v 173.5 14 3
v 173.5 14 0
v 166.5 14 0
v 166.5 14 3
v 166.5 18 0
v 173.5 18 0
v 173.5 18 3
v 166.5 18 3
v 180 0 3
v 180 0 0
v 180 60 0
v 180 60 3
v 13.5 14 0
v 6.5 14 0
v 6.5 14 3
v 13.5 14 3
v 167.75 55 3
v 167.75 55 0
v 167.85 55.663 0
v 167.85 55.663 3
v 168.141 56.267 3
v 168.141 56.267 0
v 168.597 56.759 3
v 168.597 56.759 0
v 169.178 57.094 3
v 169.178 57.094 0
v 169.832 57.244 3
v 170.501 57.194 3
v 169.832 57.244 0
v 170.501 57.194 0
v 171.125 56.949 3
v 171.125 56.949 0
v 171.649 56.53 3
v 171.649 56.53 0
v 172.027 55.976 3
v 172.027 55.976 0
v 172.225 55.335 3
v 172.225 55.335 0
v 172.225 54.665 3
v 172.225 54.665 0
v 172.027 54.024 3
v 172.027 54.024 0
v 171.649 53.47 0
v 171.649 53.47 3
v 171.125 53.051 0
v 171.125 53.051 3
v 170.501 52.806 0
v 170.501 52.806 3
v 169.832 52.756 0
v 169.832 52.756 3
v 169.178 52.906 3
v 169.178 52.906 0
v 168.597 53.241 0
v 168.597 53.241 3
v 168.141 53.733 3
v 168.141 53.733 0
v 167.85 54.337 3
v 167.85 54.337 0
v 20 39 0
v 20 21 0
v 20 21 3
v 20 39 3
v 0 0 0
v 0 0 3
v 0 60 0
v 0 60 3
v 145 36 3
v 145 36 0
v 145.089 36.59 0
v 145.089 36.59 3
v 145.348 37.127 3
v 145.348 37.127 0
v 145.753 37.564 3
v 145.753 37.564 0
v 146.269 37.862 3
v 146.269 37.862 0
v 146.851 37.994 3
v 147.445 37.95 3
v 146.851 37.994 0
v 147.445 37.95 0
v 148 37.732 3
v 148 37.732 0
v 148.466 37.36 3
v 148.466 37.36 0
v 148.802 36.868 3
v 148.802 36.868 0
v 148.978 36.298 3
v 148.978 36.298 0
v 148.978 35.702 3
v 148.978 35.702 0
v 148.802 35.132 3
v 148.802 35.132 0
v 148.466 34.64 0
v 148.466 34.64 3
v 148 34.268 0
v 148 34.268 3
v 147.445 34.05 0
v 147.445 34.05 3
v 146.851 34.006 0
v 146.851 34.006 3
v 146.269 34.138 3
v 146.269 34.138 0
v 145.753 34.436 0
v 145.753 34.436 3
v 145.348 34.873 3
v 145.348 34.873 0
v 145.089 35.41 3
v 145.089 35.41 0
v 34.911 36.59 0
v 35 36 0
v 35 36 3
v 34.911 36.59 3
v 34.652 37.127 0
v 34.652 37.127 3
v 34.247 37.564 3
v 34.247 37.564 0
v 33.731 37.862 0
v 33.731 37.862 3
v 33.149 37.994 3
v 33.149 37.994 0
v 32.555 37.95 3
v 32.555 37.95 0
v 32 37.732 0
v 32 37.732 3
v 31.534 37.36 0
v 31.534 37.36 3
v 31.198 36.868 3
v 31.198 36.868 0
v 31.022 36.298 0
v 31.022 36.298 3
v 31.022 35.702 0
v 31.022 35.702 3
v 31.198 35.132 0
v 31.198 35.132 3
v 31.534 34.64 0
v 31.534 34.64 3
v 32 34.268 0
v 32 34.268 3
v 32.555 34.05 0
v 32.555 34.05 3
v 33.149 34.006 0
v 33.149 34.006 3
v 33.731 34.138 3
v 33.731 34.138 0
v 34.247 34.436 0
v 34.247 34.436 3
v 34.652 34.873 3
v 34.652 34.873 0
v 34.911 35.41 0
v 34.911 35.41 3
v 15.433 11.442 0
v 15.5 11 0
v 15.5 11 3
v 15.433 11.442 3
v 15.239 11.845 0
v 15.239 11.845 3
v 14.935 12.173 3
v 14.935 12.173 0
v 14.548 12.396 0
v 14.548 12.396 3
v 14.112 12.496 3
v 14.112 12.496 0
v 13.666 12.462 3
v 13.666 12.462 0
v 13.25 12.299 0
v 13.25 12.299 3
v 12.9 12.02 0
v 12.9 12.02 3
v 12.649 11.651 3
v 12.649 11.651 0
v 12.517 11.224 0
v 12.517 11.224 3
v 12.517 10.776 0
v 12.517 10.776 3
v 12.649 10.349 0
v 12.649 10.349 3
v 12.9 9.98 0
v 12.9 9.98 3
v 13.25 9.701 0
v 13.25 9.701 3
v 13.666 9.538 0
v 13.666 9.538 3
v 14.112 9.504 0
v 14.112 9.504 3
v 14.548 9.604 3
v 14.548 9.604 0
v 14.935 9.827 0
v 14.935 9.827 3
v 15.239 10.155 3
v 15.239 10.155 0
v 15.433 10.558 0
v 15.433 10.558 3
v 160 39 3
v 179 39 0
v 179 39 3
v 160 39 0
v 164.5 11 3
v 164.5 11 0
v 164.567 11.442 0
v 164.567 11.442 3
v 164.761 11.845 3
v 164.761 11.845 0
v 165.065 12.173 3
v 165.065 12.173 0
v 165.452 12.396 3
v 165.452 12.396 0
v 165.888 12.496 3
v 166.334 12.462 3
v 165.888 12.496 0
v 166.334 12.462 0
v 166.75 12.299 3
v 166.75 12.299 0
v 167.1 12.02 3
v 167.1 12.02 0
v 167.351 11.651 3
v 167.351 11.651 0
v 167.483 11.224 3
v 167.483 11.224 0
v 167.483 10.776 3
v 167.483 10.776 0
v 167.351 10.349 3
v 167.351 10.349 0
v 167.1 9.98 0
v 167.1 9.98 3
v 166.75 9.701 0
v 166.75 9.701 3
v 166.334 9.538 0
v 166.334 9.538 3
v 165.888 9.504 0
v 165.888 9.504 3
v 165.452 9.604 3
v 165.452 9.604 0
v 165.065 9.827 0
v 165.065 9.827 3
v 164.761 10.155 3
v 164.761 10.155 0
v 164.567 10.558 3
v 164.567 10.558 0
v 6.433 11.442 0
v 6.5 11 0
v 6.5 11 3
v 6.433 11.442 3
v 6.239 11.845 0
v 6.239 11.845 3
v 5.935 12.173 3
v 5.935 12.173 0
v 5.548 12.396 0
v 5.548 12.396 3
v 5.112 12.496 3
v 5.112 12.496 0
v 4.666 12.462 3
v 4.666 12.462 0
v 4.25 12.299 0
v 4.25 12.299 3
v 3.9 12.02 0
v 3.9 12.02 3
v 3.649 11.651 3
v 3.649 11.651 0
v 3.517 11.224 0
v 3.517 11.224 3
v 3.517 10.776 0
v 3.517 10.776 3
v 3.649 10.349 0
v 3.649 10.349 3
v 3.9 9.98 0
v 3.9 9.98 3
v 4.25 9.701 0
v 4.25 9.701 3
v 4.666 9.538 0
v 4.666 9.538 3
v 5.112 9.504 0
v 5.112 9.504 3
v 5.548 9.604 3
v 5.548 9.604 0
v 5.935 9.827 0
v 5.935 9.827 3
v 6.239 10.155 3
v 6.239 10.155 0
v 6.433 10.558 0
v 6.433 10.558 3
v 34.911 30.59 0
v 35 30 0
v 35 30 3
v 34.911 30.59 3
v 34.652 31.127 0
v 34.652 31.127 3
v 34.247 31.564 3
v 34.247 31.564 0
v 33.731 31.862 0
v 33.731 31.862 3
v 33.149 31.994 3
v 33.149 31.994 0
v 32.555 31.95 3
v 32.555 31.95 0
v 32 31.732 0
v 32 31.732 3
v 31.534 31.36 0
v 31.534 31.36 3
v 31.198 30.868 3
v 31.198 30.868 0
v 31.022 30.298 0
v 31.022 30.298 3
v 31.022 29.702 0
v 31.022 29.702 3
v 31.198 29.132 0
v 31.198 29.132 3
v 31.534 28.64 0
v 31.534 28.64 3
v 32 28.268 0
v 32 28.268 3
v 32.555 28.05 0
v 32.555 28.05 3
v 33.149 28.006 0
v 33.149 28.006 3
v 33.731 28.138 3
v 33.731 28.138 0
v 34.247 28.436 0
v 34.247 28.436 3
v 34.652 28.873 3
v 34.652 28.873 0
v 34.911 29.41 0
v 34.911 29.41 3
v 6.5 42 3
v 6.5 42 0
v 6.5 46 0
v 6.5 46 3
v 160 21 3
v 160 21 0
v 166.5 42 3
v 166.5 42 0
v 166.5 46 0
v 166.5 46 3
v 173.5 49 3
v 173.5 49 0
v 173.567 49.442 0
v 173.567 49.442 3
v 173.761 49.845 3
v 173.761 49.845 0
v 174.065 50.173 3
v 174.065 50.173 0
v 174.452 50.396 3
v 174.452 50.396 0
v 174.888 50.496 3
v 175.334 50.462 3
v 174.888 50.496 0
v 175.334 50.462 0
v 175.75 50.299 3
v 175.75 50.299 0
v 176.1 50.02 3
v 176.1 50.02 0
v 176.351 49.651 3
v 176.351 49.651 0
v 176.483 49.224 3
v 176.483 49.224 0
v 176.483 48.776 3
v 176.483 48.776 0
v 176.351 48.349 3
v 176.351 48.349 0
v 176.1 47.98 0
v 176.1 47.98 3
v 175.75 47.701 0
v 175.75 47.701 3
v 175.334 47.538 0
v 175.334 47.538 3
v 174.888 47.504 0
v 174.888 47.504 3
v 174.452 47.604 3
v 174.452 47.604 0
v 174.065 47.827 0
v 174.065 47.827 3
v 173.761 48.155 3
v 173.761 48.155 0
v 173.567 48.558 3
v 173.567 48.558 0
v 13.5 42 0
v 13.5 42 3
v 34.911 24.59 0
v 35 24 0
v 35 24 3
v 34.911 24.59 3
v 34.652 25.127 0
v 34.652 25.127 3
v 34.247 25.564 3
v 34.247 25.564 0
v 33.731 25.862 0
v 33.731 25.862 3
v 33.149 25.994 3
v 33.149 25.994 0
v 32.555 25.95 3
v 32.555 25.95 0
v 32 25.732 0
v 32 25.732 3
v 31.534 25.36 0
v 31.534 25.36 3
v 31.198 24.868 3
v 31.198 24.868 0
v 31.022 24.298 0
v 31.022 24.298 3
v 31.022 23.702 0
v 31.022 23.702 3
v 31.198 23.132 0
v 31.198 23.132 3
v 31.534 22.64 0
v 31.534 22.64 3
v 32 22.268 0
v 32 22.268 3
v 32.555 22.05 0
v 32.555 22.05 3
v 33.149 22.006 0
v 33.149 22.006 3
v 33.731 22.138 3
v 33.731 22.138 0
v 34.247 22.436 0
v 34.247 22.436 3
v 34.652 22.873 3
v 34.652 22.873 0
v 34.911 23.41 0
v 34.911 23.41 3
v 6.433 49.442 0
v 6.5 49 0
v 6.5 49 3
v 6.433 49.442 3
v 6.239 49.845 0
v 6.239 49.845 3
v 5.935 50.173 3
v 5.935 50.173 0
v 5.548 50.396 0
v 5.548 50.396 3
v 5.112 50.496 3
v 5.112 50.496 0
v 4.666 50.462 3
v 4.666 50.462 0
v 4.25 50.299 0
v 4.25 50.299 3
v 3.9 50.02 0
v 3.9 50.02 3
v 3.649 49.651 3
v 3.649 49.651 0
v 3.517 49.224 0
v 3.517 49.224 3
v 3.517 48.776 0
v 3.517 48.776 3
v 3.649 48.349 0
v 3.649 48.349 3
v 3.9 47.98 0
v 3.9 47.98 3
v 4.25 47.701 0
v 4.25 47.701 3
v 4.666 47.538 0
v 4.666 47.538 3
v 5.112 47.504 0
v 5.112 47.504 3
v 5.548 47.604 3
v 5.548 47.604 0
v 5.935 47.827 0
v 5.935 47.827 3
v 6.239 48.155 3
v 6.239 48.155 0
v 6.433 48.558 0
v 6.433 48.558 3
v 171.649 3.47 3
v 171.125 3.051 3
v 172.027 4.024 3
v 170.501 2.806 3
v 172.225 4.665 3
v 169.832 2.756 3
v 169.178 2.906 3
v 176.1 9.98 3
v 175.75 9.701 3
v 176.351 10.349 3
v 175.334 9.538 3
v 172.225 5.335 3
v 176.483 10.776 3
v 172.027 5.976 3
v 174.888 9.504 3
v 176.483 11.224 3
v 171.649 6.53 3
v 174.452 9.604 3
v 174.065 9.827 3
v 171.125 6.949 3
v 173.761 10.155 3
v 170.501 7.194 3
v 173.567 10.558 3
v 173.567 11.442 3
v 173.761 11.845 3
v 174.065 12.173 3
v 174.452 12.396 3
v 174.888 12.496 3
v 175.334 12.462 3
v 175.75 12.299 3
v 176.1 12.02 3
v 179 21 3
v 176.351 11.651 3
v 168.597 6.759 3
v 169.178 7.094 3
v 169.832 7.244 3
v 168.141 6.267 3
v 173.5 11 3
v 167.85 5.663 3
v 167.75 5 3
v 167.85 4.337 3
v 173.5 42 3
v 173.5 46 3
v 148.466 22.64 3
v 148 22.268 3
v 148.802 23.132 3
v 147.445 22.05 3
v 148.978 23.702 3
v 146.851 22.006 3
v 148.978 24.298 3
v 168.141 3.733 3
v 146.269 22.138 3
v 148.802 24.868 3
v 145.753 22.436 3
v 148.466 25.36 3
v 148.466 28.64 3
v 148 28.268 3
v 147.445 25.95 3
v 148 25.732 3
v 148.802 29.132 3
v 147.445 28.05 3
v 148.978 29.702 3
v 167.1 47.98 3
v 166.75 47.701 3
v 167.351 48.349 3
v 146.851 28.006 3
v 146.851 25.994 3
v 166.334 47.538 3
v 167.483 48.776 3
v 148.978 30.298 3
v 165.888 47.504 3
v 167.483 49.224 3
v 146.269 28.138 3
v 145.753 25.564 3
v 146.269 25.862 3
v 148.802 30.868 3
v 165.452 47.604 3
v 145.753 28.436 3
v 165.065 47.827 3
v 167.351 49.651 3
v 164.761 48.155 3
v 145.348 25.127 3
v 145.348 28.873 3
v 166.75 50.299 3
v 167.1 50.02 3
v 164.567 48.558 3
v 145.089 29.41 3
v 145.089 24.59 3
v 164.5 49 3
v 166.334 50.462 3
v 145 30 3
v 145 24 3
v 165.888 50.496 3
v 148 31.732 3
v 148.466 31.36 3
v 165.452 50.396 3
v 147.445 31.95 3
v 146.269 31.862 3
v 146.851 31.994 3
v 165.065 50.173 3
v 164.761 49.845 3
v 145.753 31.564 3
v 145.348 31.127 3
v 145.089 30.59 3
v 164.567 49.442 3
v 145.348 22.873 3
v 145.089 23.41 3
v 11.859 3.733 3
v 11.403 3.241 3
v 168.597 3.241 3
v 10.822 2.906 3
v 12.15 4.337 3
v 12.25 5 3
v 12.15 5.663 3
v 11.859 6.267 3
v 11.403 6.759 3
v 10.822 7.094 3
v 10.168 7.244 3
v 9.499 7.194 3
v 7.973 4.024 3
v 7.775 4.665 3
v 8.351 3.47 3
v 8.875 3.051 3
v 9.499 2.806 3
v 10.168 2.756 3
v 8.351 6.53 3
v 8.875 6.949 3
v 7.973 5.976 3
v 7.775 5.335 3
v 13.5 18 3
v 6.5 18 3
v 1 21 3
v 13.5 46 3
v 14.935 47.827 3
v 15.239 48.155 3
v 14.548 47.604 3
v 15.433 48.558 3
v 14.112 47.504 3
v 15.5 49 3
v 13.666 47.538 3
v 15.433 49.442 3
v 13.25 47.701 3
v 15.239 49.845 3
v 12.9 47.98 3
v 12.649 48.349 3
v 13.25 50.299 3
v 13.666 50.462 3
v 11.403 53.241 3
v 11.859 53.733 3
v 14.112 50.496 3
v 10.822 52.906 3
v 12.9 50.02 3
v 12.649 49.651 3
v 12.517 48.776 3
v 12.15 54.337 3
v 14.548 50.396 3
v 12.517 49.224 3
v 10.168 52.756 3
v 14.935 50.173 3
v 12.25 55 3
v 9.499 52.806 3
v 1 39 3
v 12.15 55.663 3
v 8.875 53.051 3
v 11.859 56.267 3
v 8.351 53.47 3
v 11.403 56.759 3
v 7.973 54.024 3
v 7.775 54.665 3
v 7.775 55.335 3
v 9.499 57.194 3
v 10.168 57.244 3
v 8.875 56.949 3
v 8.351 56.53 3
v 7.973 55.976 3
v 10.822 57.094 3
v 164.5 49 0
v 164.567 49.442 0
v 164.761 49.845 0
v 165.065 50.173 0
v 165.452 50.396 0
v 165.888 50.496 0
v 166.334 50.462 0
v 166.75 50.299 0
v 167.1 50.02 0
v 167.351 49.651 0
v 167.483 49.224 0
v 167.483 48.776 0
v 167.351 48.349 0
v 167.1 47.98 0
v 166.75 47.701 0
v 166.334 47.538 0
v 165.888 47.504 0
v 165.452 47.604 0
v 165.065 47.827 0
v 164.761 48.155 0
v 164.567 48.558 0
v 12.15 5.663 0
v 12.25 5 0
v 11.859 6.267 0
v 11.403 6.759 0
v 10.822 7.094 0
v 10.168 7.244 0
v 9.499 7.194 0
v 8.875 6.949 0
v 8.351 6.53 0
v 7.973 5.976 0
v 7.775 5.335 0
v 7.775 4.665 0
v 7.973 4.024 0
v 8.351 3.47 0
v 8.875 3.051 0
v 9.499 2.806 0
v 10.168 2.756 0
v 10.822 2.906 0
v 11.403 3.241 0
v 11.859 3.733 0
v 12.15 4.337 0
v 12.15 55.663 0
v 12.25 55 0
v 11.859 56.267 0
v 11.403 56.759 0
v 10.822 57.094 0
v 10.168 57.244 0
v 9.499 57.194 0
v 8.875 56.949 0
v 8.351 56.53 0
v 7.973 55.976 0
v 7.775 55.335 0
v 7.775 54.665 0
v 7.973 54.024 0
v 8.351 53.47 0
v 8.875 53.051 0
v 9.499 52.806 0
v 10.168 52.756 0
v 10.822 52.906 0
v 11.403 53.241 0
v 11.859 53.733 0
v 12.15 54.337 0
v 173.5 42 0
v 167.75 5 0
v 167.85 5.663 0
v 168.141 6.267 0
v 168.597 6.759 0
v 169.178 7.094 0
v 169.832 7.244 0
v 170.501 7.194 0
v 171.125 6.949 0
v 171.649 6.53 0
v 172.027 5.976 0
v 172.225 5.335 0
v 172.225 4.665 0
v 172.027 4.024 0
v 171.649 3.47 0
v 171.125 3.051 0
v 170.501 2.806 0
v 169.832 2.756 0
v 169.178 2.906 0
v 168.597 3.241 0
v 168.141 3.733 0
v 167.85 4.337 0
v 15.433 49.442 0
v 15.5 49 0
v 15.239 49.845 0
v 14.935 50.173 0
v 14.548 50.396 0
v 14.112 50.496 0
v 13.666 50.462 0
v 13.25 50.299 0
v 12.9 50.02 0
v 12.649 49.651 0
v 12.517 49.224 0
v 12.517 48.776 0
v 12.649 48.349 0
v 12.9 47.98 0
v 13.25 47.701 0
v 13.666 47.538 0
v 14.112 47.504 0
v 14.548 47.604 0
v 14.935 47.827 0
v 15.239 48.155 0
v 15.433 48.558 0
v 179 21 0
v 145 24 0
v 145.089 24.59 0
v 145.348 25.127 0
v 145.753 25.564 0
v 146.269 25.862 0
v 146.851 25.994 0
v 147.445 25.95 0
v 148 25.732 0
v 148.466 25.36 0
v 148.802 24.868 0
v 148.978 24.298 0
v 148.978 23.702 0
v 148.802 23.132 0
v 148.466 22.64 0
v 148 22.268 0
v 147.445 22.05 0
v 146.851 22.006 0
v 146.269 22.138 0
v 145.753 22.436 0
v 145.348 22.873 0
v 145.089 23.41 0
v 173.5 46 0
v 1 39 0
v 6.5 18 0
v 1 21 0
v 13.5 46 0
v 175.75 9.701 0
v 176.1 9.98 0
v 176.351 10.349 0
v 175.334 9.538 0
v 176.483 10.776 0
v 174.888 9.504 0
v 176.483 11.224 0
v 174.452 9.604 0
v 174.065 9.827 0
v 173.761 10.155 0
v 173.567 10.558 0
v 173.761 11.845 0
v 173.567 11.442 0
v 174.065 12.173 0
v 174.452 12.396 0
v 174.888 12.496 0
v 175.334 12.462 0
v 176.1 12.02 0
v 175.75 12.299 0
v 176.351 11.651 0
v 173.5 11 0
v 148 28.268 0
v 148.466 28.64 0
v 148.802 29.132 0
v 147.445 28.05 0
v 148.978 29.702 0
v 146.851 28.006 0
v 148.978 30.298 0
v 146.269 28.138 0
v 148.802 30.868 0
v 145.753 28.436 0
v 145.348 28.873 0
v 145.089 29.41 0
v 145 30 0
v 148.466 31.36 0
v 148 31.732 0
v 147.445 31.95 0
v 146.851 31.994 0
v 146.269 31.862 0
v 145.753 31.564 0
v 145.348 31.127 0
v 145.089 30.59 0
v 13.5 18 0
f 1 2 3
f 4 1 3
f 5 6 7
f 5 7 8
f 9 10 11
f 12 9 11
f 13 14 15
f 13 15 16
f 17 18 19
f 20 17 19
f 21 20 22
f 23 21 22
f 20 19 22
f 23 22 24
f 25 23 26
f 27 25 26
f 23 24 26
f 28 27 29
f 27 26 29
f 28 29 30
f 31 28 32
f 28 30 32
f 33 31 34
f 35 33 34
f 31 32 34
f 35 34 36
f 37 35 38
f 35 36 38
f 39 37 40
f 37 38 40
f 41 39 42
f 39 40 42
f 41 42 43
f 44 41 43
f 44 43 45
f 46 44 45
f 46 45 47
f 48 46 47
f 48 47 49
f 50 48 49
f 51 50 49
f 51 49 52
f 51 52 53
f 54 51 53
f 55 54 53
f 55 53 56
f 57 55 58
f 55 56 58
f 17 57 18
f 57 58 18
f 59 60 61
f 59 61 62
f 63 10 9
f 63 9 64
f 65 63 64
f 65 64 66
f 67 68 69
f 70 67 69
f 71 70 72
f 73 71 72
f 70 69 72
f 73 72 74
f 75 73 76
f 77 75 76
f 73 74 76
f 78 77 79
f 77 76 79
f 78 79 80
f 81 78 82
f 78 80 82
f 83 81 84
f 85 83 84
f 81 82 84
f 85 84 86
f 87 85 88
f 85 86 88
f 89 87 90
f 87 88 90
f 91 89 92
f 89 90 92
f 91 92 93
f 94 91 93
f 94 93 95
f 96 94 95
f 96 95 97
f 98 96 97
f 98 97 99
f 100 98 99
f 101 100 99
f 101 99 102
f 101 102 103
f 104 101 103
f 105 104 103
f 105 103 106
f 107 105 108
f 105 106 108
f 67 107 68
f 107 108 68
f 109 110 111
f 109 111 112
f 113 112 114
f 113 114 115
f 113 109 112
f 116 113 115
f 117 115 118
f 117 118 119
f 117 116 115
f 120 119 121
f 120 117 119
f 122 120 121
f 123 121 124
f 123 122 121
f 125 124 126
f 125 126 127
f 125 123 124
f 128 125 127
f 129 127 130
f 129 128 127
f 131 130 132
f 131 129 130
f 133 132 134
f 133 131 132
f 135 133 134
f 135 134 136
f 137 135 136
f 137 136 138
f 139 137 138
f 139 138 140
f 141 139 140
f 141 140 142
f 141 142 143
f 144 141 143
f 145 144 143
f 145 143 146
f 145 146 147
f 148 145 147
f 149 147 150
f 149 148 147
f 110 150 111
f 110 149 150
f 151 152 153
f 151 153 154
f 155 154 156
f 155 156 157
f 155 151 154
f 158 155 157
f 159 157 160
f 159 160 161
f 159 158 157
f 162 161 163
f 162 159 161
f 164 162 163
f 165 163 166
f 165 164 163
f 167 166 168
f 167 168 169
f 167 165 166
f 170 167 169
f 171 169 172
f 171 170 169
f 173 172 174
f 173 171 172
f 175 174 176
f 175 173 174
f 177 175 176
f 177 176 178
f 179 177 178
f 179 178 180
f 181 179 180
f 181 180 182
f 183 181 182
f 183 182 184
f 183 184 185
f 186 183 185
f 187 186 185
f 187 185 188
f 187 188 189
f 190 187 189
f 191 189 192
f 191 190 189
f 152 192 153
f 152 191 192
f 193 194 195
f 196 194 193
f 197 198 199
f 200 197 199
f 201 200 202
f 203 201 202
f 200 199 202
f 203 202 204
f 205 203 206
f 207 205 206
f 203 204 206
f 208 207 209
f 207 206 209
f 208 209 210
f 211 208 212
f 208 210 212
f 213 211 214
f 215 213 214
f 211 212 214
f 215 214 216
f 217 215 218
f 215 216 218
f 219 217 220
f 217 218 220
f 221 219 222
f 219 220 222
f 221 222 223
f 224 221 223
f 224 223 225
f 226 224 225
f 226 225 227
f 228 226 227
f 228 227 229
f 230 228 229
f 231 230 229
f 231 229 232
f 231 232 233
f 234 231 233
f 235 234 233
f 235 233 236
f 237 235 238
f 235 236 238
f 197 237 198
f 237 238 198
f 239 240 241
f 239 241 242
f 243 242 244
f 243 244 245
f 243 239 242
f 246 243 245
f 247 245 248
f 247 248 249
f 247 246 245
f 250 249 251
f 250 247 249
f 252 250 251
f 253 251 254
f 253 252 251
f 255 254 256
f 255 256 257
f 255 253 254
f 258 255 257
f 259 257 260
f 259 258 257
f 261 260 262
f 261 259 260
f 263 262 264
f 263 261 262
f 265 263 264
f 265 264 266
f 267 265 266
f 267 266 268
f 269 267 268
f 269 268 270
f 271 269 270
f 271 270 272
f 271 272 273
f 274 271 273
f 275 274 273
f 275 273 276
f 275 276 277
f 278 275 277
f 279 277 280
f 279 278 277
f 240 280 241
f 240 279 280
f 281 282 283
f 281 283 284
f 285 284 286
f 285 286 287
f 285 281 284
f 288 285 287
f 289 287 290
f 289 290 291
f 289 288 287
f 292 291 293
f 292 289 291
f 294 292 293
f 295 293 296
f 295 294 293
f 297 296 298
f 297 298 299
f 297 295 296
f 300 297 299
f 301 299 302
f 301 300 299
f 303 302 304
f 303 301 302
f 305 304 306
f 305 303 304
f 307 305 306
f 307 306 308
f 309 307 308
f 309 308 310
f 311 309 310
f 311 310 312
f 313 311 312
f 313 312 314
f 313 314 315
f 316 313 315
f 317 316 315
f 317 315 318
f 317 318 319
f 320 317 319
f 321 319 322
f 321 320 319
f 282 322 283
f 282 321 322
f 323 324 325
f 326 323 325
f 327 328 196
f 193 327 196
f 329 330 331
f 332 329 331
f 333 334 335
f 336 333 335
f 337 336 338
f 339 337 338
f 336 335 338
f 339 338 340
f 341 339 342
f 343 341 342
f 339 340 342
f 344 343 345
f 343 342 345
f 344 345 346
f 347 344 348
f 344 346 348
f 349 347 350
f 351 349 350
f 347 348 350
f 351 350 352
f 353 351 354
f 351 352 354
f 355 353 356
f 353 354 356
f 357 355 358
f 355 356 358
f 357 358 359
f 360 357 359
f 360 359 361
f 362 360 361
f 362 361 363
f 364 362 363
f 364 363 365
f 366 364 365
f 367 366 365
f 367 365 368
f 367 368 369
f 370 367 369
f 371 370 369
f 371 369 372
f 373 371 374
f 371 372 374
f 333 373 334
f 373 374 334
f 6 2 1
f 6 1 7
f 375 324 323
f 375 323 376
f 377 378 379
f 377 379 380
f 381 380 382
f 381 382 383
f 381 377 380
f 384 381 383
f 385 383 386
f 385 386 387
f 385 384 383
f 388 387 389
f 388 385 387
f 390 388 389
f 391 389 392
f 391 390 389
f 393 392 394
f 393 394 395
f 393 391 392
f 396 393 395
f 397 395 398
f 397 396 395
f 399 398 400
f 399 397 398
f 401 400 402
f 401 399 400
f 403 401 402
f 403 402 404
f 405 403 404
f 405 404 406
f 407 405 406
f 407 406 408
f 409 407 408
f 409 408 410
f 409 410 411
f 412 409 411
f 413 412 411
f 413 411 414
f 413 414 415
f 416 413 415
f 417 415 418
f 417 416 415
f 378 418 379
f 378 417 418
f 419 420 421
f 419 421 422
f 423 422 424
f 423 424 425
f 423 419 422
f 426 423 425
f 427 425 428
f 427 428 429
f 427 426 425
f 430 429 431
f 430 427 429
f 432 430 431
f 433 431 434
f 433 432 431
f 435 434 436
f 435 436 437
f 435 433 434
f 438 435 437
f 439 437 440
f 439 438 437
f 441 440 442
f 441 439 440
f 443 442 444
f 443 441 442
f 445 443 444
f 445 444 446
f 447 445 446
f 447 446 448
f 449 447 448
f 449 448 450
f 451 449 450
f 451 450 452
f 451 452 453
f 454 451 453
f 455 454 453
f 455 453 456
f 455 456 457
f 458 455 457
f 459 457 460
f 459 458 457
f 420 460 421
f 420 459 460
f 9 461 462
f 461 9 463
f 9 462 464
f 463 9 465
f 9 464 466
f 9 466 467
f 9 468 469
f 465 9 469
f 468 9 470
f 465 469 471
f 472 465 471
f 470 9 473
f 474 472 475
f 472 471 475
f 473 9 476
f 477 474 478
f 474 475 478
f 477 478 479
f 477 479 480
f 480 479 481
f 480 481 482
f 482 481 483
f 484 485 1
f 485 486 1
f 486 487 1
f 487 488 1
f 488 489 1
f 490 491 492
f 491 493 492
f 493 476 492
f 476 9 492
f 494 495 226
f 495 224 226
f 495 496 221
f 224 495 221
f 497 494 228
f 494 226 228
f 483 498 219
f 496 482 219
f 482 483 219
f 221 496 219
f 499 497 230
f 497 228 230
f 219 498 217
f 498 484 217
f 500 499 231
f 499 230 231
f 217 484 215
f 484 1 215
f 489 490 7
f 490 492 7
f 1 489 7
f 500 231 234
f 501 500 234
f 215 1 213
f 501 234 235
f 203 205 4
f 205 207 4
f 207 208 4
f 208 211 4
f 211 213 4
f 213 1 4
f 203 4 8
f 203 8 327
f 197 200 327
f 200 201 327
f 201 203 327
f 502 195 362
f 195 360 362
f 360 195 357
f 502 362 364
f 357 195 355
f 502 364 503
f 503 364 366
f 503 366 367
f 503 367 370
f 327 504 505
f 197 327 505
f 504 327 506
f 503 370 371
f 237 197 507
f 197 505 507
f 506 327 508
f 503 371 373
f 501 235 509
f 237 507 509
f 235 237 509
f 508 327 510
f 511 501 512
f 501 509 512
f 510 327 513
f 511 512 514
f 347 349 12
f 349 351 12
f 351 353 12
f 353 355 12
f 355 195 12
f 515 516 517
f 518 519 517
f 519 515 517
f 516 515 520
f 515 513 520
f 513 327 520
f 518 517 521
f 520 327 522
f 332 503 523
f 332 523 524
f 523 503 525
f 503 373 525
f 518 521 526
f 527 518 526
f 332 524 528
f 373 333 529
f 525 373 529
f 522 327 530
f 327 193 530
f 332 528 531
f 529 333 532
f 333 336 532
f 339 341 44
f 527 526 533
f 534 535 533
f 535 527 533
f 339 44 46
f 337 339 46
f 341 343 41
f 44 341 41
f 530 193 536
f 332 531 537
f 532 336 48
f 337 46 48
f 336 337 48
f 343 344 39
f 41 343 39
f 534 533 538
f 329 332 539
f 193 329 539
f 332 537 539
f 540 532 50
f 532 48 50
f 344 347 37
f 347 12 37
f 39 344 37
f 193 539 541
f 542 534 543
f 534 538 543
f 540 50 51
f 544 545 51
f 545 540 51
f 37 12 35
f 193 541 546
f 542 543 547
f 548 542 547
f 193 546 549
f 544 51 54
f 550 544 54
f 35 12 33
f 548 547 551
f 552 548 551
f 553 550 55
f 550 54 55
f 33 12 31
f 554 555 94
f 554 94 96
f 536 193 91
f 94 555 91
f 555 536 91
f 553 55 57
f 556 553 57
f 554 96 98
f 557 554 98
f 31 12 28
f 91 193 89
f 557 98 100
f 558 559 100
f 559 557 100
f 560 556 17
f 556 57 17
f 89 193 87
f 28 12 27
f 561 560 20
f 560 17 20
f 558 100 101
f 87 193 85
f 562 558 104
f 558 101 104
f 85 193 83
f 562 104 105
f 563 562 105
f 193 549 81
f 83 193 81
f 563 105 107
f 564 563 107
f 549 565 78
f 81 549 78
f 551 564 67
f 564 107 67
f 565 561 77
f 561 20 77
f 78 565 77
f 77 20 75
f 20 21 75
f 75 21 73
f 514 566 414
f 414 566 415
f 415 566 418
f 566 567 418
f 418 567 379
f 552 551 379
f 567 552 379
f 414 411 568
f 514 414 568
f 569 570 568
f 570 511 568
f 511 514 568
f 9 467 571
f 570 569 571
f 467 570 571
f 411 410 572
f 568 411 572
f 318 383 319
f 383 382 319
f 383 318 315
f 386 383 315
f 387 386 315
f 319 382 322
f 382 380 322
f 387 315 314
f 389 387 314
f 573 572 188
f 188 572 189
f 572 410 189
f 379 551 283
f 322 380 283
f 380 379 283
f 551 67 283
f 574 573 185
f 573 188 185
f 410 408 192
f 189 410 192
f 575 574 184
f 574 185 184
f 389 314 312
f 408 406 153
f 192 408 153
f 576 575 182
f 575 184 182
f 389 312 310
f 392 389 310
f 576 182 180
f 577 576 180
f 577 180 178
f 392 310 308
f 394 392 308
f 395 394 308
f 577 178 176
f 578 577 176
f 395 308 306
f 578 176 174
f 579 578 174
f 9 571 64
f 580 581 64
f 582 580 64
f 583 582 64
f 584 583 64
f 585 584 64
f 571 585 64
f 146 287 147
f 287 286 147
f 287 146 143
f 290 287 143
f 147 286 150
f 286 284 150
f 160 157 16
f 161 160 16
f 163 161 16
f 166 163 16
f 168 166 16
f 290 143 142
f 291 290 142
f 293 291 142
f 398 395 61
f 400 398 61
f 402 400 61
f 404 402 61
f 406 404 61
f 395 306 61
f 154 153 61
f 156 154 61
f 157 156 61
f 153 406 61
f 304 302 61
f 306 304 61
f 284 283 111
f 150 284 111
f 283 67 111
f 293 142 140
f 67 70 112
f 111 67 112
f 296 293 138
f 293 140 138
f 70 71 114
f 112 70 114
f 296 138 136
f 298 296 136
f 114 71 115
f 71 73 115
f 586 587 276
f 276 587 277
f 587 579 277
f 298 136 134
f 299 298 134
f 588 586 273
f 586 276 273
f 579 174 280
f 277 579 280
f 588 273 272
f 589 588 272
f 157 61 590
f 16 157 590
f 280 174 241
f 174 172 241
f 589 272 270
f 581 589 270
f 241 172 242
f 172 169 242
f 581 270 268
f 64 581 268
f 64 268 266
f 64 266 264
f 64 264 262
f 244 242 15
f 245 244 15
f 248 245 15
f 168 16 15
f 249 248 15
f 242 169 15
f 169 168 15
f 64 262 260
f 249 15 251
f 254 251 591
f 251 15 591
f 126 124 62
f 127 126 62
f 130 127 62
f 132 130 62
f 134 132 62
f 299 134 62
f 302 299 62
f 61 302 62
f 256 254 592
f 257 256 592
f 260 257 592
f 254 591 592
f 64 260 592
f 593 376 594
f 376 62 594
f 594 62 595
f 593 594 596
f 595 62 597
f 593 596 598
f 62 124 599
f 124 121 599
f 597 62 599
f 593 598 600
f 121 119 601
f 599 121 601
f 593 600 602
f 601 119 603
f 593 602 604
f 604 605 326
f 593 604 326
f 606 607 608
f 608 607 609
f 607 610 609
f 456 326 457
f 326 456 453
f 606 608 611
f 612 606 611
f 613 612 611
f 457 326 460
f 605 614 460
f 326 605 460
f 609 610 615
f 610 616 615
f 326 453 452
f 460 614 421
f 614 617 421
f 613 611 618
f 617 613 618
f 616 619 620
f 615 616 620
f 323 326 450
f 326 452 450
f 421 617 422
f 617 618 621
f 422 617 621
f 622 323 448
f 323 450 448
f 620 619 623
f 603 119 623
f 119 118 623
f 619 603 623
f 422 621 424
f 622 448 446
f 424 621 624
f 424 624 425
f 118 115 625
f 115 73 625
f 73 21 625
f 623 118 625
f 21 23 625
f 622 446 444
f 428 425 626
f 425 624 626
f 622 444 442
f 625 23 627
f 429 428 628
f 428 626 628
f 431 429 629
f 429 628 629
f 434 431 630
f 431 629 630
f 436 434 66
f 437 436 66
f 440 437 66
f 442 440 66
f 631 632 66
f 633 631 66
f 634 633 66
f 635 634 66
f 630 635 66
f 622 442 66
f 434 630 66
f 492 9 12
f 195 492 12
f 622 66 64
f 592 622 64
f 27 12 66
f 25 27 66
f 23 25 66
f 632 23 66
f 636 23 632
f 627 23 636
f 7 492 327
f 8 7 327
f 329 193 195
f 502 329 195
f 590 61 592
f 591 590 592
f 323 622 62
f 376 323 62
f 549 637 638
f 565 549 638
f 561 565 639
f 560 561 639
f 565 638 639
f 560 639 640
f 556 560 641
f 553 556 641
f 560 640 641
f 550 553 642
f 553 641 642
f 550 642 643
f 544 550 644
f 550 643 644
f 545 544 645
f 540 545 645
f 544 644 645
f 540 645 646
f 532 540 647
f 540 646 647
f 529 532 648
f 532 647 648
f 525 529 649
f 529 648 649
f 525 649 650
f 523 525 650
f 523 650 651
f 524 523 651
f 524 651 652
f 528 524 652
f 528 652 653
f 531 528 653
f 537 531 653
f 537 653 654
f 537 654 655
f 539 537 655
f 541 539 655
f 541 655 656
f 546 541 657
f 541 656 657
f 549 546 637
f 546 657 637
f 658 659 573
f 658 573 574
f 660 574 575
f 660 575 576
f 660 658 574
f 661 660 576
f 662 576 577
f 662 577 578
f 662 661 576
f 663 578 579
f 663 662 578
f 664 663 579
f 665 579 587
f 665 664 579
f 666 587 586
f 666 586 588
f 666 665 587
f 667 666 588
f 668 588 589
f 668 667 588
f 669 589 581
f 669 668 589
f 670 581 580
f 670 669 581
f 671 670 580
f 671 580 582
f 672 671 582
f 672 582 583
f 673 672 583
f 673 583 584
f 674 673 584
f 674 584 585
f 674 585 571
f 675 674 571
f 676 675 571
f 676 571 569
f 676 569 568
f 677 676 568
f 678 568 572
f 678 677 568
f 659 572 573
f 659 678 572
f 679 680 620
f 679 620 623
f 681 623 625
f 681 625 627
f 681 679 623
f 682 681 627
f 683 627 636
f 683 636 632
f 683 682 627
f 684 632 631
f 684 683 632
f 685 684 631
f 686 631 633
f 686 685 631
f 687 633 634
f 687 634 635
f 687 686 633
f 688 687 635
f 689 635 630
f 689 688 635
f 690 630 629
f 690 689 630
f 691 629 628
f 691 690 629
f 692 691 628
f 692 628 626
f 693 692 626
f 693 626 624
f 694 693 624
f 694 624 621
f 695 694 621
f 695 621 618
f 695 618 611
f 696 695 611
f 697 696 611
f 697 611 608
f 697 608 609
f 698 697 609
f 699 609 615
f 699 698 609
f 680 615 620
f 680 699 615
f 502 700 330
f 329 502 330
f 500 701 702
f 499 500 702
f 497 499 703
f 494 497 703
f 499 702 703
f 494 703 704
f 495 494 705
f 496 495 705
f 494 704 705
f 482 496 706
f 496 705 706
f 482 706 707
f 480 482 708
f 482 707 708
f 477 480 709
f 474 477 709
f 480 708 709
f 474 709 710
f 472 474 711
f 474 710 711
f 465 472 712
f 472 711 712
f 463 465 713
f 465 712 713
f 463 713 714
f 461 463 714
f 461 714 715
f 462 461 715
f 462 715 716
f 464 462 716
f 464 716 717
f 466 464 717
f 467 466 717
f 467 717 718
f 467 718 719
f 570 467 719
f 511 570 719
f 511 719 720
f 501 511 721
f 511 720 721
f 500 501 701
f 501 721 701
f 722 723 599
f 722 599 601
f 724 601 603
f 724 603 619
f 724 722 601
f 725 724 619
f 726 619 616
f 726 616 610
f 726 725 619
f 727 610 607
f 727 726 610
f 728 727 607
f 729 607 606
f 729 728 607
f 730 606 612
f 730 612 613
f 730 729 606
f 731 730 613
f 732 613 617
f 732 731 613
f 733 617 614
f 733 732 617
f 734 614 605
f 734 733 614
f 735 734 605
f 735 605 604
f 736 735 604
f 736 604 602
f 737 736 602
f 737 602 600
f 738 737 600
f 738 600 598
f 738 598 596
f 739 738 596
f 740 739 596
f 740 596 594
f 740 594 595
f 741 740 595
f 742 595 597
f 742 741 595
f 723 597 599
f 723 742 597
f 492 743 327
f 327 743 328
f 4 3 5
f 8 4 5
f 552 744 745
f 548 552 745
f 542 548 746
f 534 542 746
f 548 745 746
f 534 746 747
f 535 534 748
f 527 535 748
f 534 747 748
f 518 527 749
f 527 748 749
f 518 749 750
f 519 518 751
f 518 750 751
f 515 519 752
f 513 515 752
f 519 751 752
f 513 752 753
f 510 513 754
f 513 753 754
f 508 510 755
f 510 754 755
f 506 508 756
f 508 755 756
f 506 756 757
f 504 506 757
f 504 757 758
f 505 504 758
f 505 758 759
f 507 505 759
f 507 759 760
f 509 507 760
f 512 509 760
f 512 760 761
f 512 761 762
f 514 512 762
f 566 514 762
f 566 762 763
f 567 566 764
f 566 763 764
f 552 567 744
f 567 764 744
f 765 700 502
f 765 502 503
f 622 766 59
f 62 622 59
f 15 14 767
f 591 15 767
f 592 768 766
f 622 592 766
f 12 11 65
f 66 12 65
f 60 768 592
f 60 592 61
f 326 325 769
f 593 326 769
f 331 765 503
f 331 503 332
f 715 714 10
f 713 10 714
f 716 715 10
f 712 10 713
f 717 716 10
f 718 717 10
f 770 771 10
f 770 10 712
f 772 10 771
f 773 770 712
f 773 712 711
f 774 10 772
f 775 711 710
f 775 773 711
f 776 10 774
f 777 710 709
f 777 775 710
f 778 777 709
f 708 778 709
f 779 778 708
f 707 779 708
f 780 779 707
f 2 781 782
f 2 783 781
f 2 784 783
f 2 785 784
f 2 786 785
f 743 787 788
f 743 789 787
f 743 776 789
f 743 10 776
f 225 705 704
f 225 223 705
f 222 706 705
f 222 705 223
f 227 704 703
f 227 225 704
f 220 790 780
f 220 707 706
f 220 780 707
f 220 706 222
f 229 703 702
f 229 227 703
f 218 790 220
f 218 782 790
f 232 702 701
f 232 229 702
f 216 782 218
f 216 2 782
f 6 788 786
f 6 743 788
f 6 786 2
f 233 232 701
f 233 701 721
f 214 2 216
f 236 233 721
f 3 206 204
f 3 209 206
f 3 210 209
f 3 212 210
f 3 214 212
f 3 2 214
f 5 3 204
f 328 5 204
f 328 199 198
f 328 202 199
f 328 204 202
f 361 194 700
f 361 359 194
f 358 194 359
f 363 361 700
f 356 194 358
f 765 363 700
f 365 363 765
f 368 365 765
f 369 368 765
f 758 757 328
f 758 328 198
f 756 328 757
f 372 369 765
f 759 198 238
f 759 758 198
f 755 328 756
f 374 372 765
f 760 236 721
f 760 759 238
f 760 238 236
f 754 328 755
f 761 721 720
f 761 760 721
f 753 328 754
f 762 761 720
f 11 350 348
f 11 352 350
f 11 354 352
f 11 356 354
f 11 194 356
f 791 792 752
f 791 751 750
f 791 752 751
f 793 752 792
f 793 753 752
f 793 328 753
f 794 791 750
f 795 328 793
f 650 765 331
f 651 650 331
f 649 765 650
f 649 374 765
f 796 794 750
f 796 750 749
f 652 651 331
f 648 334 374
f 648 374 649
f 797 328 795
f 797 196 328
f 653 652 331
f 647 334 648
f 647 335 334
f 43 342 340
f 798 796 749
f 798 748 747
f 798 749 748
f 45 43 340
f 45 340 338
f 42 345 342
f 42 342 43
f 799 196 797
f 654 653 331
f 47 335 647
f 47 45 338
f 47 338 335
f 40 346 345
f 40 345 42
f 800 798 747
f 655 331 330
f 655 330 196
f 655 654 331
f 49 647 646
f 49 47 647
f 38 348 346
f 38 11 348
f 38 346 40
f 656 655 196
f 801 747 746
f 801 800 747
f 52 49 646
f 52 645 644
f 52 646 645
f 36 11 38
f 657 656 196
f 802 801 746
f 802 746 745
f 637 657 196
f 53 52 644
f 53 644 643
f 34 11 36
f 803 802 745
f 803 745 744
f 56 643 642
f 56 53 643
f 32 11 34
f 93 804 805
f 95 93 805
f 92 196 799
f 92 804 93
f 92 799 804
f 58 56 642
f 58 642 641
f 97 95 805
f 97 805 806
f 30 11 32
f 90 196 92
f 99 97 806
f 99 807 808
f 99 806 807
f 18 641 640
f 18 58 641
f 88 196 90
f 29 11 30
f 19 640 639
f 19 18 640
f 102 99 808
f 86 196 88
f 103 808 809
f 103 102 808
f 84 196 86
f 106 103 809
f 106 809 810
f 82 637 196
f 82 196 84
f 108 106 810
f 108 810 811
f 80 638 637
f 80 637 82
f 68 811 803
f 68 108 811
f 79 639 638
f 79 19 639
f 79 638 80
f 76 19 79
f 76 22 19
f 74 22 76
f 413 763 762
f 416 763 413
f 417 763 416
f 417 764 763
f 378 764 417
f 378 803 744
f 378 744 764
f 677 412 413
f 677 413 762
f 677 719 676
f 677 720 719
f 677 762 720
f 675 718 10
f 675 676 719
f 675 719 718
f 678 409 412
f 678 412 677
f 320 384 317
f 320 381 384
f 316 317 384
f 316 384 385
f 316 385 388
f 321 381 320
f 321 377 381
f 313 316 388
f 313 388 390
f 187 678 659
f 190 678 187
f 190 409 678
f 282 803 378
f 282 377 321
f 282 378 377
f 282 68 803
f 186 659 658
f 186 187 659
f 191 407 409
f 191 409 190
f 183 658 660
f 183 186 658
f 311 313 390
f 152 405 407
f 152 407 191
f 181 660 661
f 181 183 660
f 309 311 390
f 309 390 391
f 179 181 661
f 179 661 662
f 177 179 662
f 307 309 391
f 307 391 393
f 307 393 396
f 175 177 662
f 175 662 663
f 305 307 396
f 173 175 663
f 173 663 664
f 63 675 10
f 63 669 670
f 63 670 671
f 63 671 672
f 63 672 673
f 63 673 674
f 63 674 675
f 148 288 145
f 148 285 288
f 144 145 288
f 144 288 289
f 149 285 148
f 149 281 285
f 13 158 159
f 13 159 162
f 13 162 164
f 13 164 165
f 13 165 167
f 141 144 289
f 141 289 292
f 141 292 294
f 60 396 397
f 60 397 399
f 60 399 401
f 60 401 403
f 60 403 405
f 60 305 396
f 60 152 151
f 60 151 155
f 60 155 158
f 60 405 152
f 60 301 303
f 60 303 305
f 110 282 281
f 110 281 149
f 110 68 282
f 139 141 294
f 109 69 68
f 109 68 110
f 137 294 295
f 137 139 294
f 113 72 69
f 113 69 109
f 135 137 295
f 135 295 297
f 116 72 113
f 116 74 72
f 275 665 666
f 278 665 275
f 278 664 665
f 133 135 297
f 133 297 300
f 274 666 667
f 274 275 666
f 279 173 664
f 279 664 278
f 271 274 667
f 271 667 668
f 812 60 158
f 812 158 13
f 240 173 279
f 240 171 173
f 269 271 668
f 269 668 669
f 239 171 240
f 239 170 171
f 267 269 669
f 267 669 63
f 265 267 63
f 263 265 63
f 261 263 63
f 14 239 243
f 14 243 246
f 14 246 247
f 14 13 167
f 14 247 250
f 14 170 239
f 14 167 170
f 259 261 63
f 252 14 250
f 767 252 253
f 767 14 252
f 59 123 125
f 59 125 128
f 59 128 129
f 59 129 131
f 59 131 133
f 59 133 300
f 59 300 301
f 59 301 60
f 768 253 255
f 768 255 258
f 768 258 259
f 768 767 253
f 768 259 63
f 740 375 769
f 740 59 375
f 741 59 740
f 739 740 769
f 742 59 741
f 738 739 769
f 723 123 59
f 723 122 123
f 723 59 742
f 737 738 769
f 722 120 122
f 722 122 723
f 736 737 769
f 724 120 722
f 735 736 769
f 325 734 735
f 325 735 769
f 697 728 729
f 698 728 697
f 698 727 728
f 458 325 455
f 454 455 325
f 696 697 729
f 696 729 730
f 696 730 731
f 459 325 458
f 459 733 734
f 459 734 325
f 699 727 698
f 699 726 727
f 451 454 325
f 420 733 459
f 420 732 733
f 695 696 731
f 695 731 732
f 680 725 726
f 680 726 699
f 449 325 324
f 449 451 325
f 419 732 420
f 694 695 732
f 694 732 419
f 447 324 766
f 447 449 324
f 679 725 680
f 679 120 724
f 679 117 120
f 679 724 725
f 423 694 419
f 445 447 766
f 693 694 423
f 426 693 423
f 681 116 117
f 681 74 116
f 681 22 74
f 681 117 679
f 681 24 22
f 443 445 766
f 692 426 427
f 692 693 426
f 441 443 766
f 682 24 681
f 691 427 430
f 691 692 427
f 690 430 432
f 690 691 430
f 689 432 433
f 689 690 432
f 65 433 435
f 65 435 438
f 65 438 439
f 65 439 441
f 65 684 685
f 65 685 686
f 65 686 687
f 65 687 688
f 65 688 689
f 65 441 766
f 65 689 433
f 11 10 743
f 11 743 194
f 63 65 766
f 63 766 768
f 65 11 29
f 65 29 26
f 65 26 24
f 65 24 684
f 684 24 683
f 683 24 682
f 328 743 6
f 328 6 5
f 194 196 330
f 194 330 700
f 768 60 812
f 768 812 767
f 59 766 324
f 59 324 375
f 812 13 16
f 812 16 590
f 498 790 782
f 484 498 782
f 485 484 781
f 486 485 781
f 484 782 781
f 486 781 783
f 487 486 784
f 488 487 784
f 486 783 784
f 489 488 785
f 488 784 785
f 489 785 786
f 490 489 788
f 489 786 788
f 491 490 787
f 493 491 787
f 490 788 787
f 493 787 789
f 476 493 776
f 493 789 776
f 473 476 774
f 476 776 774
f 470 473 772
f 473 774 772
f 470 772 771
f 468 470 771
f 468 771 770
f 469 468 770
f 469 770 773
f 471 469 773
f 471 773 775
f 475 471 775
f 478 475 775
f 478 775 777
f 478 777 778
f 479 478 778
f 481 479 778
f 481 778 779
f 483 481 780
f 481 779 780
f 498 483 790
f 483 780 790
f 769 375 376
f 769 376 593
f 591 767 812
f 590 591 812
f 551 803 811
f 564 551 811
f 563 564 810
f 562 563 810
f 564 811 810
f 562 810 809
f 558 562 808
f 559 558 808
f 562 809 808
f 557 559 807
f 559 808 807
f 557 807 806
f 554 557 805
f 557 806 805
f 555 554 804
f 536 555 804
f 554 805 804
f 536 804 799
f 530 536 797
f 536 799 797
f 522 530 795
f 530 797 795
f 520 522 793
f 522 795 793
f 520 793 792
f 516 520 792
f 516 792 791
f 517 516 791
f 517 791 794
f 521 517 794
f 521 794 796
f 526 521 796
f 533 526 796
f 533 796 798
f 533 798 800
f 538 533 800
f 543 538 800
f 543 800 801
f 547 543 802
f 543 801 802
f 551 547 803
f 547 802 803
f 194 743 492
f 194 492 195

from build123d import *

# Parameters (mm, degrees)
SKETCH_W   = 90
SKETCH_H   = 60
SKETCH_R   = 2.25
SKETCH_R_2 = 2
SKETCH_R_3 = 1.5
SKETCH_W_2 = 7
SKETCH_H_2 = 4
SKETCH_W_3 = 19
SKETCH_H_3 = 18
PAD_DEPTH  = 3


with BuildPart() as part:
    # Sketch → Pad (new body)
    with BuildSketch(Plane.XY):
        with Locations((45, 30)):
            Rectangle(SKETCH_W, SKETCH_H)
        with Locations((10, 5)):
            Circle(SKETCH_R, mode=Mode.SUBTRACT)
        with Locations((33, 24)):
            Circle(SKETCH_R_2, mode=Mode.SUBTRACT)
        with Locations((33, 36)):
            Circle(SKETCH_R_2, mode=Mode.SUBTRACT)
        with Locations((33, 30)):
            Circle(SKETCH_R_2, mode=Mode.SUBTRACT)
        with Locations((10, 55)):
            Circle(SKETCH_R, mode=Mode.SUBTRACT)
        with Locations((14, 11)):
            Circle(SKETCH_R_3, mode=Mode.SUBTRACT)
        with Locations((5, 11)):
            Circle(SKETCH_R_3, mode=Mode.SUBTRACT)
        with Locations((14, 49)):
            Circle(SKETCH_R_3, mode=Mode.SUBTRACT)
        with Locations((5, 49)):
            Circle(SKETCH_R_3, mode=Mode.SUBTRACT)
        with Locations((10, 16)):
            Rectangle(SKETCH_W_2, SKETCH_H_2, mode=Mode.SUBTRACT)
        with Locations((10, 44)):
            Rectangle(SKETCH_W_2, SKETCH_H_2, mode=Mode.SUBTRACT)
        with Locations((10.5, 30)):
            Rectangle(SKETCH_W_3, SKETCH_H_3, mode=Mode.SUBTRACT)
    pad = extrude(amount=PAD_DEPTH)

    # Mirrored: Pad across face of Pad
    add(pad.mirror(Plane(origin=(90, 30, 1.5), x_dir=(0, 1, 0), z_dir=(1, 0, 0))))


solid = part.part
